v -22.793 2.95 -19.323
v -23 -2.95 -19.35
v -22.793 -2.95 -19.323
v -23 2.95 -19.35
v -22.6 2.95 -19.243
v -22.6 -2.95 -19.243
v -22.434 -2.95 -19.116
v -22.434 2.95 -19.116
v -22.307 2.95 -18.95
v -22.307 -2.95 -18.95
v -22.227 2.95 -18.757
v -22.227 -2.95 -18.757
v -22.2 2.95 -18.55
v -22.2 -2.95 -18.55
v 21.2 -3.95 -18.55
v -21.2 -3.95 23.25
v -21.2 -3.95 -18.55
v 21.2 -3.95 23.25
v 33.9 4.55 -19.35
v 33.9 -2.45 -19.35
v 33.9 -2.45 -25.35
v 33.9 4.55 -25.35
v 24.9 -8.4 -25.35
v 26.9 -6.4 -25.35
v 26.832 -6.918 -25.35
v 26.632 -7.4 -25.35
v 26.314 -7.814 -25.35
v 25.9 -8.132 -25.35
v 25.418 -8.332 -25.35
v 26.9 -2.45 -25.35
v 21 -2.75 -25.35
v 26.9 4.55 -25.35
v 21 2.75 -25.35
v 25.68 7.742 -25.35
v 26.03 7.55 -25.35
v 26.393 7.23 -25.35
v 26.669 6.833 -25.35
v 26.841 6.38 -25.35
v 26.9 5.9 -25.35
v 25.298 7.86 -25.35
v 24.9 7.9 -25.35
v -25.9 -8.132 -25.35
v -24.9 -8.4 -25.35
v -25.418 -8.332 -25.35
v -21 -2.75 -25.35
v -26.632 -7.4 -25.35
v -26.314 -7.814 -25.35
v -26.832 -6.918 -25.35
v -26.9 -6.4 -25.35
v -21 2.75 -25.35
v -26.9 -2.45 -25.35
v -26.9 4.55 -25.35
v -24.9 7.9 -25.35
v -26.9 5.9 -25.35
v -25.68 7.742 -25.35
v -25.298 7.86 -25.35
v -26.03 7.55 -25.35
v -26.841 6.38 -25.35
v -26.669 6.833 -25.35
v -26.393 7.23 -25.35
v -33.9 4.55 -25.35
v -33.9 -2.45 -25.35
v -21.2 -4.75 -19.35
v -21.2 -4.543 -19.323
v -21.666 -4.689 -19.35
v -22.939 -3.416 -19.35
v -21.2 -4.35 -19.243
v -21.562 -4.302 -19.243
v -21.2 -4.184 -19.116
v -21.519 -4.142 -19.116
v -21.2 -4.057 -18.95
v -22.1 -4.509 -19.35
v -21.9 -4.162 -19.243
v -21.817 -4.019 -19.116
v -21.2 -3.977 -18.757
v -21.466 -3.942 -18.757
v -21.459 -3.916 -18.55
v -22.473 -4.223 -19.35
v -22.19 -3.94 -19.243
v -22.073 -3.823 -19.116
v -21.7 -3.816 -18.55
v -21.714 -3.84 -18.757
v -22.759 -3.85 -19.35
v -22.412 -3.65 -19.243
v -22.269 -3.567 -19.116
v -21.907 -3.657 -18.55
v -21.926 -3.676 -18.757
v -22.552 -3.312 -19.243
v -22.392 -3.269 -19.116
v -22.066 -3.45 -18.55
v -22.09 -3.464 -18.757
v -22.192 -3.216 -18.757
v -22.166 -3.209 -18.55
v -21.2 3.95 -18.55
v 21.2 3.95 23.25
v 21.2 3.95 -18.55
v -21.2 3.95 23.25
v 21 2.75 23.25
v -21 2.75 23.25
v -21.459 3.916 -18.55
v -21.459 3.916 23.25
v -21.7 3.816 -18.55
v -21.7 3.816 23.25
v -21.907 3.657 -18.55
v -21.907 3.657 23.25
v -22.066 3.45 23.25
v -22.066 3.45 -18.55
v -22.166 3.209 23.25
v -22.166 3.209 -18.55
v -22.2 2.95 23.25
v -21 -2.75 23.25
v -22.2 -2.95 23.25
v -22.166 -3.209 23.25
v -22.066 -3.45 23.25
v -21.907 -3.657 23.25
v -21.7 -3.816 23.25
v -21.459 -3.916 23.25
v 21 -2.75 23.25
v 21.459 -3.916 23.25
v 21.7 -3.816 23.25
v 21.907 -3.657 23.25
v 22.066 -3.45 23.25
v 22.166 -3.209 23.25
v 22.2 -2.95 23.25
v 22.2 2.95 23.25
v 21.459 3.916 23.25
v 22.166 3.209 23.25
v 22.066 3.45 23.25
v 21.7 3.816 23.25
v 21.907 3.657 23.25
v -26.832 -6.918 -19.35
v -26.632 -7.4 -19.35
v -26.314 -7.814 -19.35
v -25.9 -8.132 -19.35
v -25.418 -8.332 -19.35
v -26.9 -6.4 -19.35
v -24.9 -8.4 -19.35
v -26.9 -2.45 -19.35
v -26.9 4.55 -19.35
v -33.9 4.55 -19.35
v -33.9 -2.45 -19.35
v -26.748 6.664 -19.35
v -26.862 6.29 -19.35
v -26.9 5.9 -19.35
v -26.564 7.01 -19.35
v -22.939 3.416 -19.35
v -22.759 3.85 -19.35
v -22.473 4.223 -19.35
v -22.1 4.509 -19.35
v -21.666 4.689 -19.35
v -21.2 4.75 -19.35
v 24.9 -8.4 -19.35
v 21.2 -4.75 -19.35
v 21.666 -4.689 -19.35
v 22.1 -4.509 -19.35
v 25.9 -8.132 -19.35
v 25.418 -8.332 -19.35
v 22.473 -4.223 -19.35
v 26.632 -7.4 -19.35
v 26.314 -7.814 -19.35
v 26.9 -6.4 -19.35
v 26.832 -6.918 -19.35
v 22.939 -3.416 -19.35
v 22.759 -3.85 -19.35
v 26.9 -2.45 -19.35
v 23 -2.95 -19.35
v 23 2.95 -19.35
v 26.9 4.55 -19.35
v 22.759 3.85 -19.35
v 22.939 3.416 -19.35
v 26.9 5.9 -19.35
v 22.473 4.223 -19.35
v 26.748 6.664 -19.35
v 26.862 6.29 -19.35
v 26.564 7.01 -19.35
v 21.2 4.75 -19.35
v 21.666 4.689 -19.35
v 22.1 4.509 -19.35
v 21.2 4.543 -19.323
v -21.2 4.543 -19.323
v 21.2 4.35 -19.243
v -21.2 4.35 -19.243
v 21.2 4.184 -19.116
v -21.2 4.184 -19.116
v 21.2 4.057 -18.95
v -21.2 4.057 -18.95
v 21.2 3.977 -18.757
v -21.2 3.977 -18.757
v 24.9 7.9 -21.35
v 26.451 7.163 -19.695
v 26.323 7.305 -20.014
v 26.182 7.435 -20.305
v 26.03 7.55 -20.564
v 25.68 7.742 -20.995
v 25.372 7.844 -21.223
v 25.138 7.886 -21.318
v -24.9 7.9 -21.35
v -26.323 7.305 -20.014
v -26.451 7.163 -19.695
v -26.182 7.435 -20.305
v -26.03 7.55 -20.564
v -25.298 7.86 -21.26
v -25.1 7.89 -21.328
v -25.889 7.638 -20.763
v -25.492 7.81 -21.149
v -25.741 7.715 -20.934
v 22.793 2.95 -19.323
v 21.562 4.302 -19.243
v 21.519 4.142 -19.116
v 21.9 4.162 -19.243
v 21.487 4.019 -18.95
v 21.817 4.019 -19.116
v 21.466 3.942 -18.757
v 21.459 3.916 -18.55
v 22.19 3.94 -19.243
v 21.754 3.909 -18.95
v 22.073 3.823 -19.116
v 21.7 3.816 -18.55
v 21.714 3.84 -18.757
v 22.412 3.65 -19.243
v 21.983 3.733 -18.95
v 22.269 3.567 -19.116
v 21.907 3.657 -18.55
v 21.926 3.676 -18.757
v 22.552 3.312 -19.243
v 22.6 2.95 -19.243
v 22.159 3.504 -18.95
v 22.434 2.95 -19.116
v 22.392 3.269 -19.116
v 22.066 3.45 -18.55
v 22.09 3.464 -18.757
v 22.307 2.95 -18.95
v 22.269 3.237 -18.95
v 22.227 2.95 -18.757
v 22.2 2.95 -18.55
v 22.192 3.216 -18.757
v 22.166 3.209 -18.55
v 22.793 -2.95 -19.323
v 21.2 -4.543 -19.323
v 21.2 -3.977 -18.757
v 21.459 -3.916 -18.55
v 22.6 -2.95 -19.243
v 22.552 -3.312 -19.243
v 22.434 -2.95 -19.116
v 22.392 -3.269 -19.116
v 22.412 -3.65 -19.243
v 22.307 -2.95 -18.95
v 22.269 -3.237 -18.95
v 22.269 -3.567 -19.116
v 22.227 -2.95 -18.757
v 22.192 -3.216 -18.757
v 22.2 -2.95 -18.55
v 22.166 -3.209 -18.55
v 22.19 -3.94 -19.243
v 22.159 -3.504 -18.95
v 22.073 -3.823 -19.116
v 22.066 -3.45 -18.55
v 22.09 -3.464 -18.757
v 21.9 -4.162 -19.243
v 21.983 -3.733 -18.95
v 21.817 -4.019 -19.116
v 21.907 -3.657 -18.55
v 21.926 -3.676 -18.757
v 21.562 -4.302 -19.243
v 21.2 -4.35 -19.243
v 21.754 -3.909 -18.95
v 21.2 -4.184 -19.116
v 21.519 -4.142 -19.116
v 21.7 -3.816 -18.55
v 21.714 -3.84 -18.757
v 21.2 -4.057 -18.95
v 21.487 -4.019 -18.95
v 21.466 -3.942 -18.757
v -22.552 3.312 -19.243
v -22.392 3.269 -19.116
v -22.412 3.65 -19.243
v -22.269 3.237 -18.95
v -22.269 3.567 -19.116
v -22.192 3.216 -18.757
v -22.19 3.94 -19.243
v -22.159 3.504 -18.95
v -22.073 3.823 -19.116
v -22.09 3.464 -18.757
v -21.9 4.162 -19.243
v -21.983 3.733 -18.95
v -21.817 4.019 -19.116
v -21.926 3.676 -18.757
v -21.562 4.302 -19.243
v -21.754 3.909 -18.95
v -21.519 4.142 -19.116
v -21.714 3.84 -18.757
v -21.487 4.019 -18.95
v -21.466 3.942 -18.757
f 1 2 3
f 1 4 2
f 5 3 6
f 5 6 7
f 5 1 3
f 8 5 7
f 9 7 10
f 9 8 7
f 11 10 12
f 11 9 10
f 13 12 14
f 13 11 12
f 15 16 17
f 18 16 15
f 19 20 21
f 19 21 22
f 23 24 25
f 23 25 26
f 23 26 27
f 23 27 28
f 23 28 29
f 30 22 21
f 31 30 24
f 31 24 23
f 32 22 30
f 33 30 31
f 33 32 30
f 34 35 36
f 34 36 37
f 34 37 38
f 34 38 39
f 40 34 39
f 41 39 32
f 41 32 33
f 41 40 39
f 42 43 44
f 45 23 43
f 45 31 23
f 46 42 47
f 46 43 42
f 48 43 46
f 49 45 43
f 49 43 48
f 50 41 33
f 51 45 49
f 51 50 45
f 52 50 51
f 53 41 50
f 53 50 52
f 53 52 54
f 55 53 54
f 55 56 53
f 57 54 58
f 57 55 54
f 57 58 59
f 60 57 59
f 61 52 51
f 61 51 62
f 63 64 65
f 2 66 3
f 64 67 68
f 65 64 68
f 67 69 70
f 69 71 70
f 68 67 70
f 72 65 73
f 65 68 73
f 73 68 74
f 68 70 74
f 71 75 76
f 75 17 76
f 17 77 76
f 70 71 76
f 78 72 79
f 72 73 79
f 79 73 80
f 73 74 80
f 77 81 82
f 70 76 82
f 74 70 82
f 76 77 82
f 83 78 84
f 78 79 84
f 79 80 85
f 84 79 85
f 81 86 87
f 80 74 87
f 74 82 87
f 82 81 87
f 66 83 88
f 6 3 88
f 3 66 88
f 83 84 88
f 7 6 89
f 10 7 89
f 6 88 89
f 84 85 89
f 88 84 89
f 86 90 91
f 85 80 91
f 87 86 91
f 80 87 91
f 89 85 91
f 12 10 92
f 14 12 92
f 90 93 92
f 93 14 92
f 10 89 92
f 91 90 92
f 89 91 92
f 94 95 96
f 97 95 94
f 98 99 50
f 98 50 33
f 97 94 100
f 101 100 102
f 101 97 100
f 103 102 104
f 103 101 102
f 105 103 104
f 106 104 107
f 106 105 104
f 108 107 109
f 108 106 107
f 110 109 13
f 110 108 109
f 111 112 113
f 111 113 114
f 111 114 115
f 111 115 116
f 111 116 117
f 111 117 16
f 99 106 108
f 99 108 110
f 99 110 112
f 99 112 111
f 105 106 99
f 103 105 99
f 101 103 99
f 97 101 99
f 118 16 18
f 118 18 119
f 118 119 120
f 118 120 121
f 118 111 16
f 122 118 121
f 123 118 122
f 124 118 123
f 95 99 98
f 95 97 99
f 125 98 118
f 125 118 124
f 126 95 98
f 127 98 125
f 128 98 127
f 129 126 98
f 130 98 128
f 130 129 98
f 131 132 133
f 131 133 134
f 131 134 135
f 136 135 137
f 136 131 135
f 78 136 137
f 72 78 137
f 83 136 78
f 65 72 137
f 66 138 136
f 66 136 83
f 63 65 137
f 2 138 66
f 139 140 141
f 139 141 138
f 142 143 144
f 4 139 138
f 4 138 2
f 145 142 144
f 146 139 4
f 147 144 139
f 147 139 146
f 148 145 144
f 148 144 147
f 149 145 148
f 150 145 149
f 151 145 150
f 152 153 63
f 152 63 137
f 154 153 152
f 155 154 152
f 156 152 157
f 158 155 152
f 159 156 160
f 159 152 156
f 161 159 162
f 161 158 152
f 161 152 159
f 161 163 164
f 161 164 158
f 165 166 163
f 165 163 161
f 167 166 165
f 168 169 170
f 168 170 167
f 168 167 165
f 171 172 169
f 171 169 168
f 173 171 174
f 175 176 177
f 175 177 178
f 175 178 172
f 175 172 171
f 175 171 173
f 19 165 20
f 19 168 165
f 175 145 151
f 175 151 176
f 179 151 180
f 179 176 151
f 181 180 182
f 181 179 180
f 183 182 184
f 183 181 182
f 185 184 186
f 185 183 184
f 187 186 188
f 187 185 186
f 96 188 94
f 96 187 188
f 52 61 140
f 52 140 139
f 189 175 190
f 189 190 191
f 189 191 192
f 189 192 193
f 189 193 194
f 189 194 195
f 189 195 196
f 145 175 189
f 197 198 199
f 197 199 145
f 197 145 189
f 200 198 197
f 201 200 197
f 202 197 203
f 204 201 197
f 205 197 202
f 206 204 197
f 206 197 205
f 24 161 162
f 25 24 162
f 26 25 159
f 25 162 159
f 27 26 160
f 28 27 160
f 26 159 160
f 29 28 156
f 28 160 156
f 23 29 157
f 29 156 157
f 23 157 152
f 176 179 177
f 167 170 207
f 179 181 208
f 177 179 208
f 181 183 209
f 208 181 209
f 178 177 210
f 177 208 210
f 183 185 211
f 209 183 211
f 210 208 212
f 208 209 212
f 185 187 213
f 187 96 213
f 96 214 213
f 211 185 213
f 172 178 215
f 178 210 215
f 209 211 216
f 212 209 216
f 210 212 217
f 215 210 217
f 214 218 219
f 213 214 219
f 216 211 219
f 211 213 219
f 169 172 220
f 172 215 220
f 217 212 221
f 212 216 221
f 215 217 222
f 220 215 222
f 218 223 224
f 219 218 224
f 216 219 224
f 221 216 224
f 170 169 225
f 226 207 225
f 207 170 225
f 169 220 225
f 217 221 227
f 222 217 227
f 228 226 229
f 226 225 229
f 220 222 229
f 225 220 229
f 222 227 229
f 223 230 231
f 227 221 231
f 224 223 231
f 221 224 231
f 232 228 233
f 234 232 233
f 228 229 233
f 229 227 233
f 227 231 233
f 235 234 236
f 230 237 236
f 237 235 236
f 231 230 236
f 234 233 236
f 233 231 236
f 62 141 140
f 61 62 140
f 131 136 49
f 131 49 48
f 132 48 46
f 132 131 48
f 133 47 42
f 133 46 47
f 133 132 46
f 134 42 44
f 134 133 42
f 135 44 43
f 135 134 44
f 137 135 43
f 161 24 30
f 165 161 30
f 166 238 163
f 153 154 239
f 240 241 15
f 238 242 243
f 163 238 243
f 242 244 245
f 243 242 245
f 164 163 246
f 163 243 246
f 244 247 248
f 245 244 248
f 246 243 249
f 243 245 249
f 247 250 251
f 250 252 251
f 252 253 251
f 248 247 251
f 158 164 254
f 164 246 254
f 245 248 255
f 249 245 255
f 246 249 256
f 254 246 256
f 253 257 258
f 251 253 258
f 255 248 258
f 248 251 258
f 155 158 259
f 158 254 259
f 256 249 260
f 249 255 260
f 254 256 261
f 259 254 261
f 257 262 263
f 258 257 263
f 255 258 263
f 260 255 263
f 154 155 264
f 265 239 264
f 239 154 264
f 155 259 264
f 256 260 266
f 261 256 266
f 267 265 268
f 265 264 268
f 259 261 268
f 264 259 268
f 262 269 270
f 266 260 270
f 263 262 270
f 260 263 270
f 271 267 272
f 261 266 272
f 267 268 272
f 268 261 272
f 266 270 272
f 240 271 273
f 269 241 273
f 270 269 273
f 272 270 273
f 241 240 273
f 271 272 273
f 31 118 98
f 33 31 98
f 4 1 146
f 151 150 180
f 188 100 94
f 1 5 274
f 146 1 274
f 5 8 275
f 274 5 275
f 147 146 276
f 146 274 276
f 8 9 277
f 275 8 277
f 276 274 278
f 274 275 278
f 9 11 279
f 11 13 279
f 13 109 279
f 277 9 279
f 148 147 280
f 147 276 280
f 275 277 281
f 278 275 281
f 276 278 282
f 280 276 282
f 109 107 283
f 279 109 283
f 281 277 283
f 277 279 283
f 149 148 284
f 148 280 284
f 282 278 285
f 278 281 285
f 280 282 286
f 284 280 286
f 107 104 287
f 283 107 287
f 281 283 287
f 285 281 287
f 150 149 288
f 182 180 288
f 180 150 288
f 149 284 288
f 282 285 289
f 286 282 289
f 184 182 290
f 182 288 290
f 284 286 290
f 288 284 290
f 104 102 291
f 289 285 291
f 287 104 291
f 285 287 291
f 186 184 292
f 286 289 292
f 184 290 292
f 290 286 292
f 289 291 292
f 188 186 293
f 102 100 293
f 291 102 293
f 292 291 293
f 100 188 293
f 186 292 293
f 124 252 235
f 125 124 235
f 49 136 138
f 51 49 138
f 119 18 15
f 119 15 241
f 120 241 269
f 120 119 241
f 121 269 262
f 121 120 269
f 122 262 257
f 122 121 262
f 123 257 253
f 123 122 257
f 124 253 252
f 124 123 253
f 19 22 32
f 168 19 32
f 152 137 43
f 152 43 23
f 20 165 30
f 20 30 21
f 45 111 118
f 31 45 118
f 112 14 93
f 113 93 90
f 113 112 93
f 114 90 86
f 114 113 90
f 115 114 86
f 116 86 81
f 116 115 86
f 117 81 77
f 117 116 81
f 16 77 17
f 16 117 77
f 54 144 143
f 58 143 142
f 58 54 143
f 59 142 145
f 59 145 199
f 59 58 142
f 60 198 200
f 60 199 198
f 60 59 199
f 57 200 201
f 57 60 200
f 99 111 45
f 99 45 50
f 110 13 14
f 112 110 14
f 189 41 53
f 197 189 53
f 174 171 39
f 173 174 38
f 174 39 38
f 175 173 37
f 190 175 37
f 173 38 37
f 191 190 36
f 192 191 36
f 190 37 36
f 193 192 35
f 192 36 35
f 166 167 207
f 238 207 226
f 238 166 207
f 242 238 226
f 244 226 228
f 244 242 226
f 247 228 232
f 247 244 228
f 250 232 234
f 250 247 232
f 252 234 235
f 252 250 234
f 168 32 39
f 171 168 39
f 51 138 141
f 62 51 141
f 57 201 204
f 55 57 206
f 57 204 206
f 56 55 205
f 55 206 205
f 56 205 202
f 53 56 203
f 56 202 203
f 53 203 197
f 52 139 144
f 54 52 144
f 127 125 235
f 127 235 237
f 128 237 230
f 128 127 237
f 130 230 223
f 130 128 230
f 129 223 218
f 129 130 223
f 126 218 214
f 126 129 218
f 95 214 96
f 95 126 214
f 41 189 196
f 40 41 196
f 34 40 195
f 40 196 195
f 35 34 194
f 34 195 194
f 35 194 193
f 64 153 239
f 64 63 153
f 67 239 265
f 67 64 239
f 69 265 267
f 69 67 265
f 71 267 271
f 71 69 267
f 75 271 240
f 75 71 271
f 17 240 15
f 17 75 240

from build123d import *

# Parameters (mm, degrees)
SKETCH1_W           = 53.8
SKETCH1_H           = 16.8
SKETCH1_W_2         = 42
SKETCH1_H_2         = 5.5
BOSS_EXTRUDE1_DEPTH = 27
SKETCH4_W           = 53.8
SKETCH4_H           = 16.8
SKETCH4_W_2         = 44.4
SKETCH4_H_2         = 7.9
CUT_EXTRUDE2_DEPTH  = 19.35
SKETCH2_W           = 7
SKETCH2_H           = 10
BOSS_EXTRUDE2_DEPTH = 6
SKETCH3_R           = 1.35
CUT_EXTRUDE1_DEPTH  = 8
CUT_EXTRUDE4_REACH  = 66.31
SKETCH7_W           = 53.8
SKETCH7_H           = 0.5
FILLET2_R           = 1
FILETE1_R           = 2
SKETCH5_W           = 53.8
SKETCH5_H           = 16.8
CUT_EXTRUDE3_DEPTH  = 1.65
CUT_EXTRUDE5_REACH  = 63.565
CUT_EXTRUDE6_REACH  = 64.931
BOSS_EXTRUDE3_START = -7
SKETCH10_R          = 1.35
BOSS_EXTRUDE3_DEPTH = 7
CUT_EXTRUDE7_DEPTH  = 1.65
SKETCH13_W          = 6
SKETCH13_H          = 16.8
CUT_EXTRUDE8_DEPTH  = 73.869901194
FILLET6_R           = 0.8
BOSS_EXTRUDE4_START = 3.9
SKETCH14_W          = 42
SKETCH14_H          = 5.5
BOSS_EXTRUDE4_DEPTH = 3.9


with BuildPart() as part:
    # Sketch1 → Boss-Extrude1 (new, symmetric)
    with BuildSketch(Plane.XY):
        Rectangle(SKETCH1_W, SKETCH1_H)
        Rectangle(SKETCH1_W_2, SKETCH1_H_2, mode=Mode.SUBTRACT)
    extrude(amount=BOSS_EXTRUDE1_DEPTH, both=True)

    # Sketch4 → Cut-Extrude2 (cut, symmetric)
    with BuildSketch(Plane.XY):
        Rectangle(SKETCH4_W, SKETCH4_H)
        Rectangle(SKETCH4_W_2, SKETCH4_H_2, mode=Mode.SUBTRACT)
    extrude(amount=CUT_EXTRUDE2_DEPTH, both=True, mode=Mode.SUBTRACT)

    # Sketch2 → Boss-Extrude2 (add)
    with BuildSketch(Plane(origin=(0, 0, 19.35), x_dir=(-1, 0, 0), z_dir=(0, 0, -1))):
        with Locations((-30.4, 2.55)):
            Rectangle(SKETCH2_W, SKETCH2_H)
        with Locations((30.4, 2.55)):
            Rectangle(SKETCH2_W, SKETCH2_H)
    boss_extrude2 = extrude(amount=-BOSS_EXTRUDE2_DEPTH)

    # Sketch3 → Cut-Extrude1 (cut)
    with BuildSketch(Plane.XZ.offset(2.45)):
        with Locations((-30.9, 22.35)):
            Circle(SKETCH3_R)
        with Locations((30.9, 22.35)):
            Circle(SKETCH3_R)
    cut_extrude1 = extrude(amount=-CUT_EXTRUDE1_DEPTH, mode=Mode.SUBTRACT)

    # Mirror8: Boss-Extrude2, Cut-Extrude1 across plane
    add(boss_extrude2.mirror(Plane.XY))
    add(cut_extrude1.mirror(Plane.XY), mode=Mode.SUBTRACT)

    # Sketch7 → Cut-Extrude4 (cut, up to next)
    with BuildSketch(Plane(origin=(0, 0, -27), x_dir=(-1, 0, 0), z_dir=(0, 0, -1)), mode=Mode.PRIVATE) as cut_extrude4_sk1:
        with Locations((0, 8.15)):
            Rectangle(SKETCH7_W, SKETCH7_H)
    cut_extrude4_tool1 = extrude(cut_extrude4_sk1.sketch, amount=-CUT_EXTRUDE4_REACH, mode=Mode.PRIVATE) & part.part
    add(cut_extrude4_tool1.solids().sort_by_distance((0, 8.15, -27))[0], mode=Mode.SUBTRACT)

    # Fillet2
    fillet2_edges = [part.edges().sort_by_distance(p)[0] for p in [
        (-22.2, -3.95, 0),
        (-22.2, 3.95, 0),
        (22.2, 3.95, 0),
        (22.2, -3.95, 0),
    ]]
    fillet(fillet2_edges, radius=FILLET2_R)

    # Filete1
    filete1_edges = [part.edges().sort_by_distance(p)[0] for p in [
        (-26.9, -8.4, -23.175),
        (26.9, -8.4, -23.175),
        (26.9, -8.4, 23.175),
        (-26.9, -8.4, 23.175),
        (26.9, 8.4, 23.175),
        (-26.9, 8.4, 23.175),
        (-26.9, 7.9, -23.175),
        (26.9, 7.9, -23.175),
    ]]
    fillet(filete1_edges, radius=FILETE1_R)

    # Sketch5 → Cut-Extrude3 (cut)
    with BuildSketch(Plane.XY.offset(27)):
        Rectangle(SKETCH5_W, SKETCH5_H)
    extrude(amount=-CUT_EXTRUDE3_DEPTH, mode=Mode.SUBTRACT)

    # Chamfer1
    # the kernel refuses this chamfer: 2, 0.890457371 mm, written as the material it takes off along each edge
    with BuildSketch(Plane(origin=(-37.34003391, 7.9, -19.35), x_dir=(0, -0.9968798599783938, 0.07893379991776824), z_dir=(1, 0, 0))) as chamfer1_piece_1:
        with BuildLine():
            Line((0.925885194, 0), (-0.196073774, 2.064046904))
            Line((-0.196073774, 2.064046904), (-0.235948969, 2.060889552))
            ThreePointArc((-0.235948969, 2.060889552), (-0.121693379, 1.030150311), (-0.039875194, -0.003157352))
            Line((-0.039875194, -0.003157352), (0.003157352, -0.039875194))
            ThreePointArc((0.003157352, -0.039875194), (0.463215564, -0.003447392), (0.929042546, -0.039875194))
            Line((0.929042546, -0.039875194), (0.925885194, 0))
        make_face()
    extrude(amount=74.680067819, mode=Mode.SUBTRACT)

    # Sketch8 → Cut-Extrude5 (cut, up to next)
    with BuildSketch(Plane(origin=(0, 0, -25.35), x_dir=(-1, 0, 0), z_dir=(0, 0, -1)), mode=Mode.PRIVATE) as cut_extrude5_sk1:
        with BuildLine():
            Line((-26.030265456, 7.55), (-33.9, 7.55))
            Line((-33.9, 7.55), (-33.9, 4.55))
            Line((-33.9, 4.55), (-26.9, 4.55))
            Line((-26.9, 4.55), (-26.9, 5.9))
            ThreePointArc((-26.9, 5.9), (-26.669255622, 6.832595595), (-26.030265456, 7.55))
        make_face()
    cut_extrude5_tool1 = extrude(cut_extrude5_sk1.sketch, amount=-CUT_EXTRUDE5_REACH, mode=Mode.PRIVATE) & part.part
    # Sketch8 → Cut-Extrude5 (cut, up to next)
    with BuildSketch(Plane(origin=(0, 0, -25.35), x_dir=(-1, 0, 0), z_dir=(0, 0, -1)), mode=Mode.PRIVATE) as cut_extrude5_sk2:
        with BuildLine():
            Line((26.9, 4.55), (26.9, 5.9))
            ThreePointArc((26.9, 5.9), (26.669255622, 6.832595595), (26.030265456, 7.55))
            Line((26.030265456, 7.55), (33.9, 7.55))
            Line((33.9, 7.55), (33.9, 4.55))
            Line((33.9, 4.55), (26.9, 4.55))
        make_face()
    cut_extrude5_tool2 = extrude(cut_extrude5_sk2.sketch, amount=-CUT_EXTRUDE5_REACH, mode=Mode.PRIVATE) & part.part
    add(cut_extrude5_tool1.solids().sort_by_distance((30.325305, 6.072078, -25.35))[0], mode=Mode.SUBTRACT)
    add(cut_extrude5_tool2.solids().sort_by_distance((-30.325305, 6.072078, -25.35))[0], mode=Mode.SUBTRACT)

    # Sketch9 → Cut-Extrude6 (cut, up to next)
    with BuildSketch(Plane.XY.offset(25.35), mode=Mode.PRIVATE) as cut_extrude6_sk1:
        Polygon((26.9, 5.9), (26.9, 7.55), (33.9, 7.55), (33.9, 4.55), (26.9, 4.55), align=None)
    cut_extrude6_tool1 = extrude(cut_extrude6_sk1.sketch, amount=-CUT_EXTRUDE6_REACH, mode=Mode.PRIVATE) & part.part
    # Sketch9 → Cut-Extrude6 (cut, up to next)
    with BuildSketch(Plane.XY.offset(25.35), mode=Mode.PRIVATE) as cut_extrude6_sk2:
        Polygon((-26.9, 5.9), (-26.9, 4.55), (-33.9, 4.55), (-33.9, 7.55), (-26.9, 7.55), align=None)
    cut_extrude6_tool2 = extrude(cut_extrude6_sk2.sketch, amount=-CUT_EXTRUDE6_REACH, mode=Mode.PRIVATE) & part.part
    add(cut_extrude6_tool1.solids().sort_by_distance((30.4, 6.05, 25.35))[0], mode=Mode.SUBTRACT)
    add(cut_extrude6_tool2.solids().sort_by_distance((-30.4, 6.05, 25.35))[0], mode=Mode.SUBTRACT)

    # Sketch10 → Boss-Extrude3 (add)
    with BuildSketch(Plane(origin=(0, 4.55, 0), x_dir=(1, 0, 0), z_dir=(0, 1, 0)).offset(BOSS_EXTRUDE3_START)):
        with Locations((30.9, -22.35)):
            Circle(SKETCH10_R)
        with Locations((-30.9, -22.35)):
            Circle(SKETCH10_R)
    boss_extrude3 = extrude(amount=BOSS_EXTRUDE3_DEPTH)

    # Mirror9: Boss-Extrude3 across plane
    add(boss_extrude3.mirror(Plane.XY))

    # Sketch11 → Cut-Extrude7 (cut)
    with BuildSketch(Plane(origin=(0, 0, -27), x_dir=(-1, 0, 0), z_dir=(0, 0, -1))):
        with BuildLine():
            Line((26.9, -6.4), (26.9, 5.9))
            ThreePointArc((26.9, 5.9), (26.314213562, 7.314213562), (24.9, 7.9))
            Line((24.9, 7.9), (-24.9, 7.9))
            ThreePointArc((-24.9, 7.9), (-26.314213562, 7.314213562), (-26.9, 5.9))
            Line((-26.9, 5.9), (-26.9, -6.4))
            ThreePointArc((-26.9, -6.4), (-26.314213562, -7.814213562), (-24.9, -8.4))
            Line((-24.9, -8.4), (24.9, -8.4))
            ThreePointArc((24.9, -8.4), (26.314213562, -7.814213562), (26.9, -6.4))
        make_face()
    extrude(amount=-CUT_EXTRUDE7_DEPTH, mode=Mode.SUBTRACT)

    # Sketch13 → Cut-Extrude8 (cut, through all)
    with BuildSketch(Plane.ZY.offset(33.9)):
        with Locations((22.35, 0)):
            Rectangle(SKETCH13_W, SKETCH13_H)
    extrude(amount=-CUT_EXTRUDE8_DEPTH, mode=Mode.SUBTRACT)

    # Fillet6
    fillet6_edges = [part.edges().sort_by_distance(p)[0] for p in [
        (-22.2, 0, -19.35),
        (0, -3.95, -19.35),
        (22.2, 0, -19.35),
        (0, 3.95, -19.35),
        (-21.907106781, -3.657106781, -19.35),
        (21.907106781, -3.657106781, -19.35),
        (21.907106781, 3.657106781, -19.35),
        (-21.907106781, 3.657106781, -19.35),
    ]]
    fillet(fillet6_edges, radius=FILLET6_R)

    # Sketch14 → Boss-Extrude4 (add)
    with BuildSketch(Plane.XY.offset(19.35).offset(BOSS_EXTRUDE4_START)):
        with BuildLine():
            Line((22.2, -2.95), (22.2, 2.95))
            ThreePointArc((22.2, 2.95), (21.907106781, 3.657106781), (21.2, 3.95))
            Line((21.2, 3.95), (-21.2, 3.95))
            ThreePointArc((-21.2, 3.95), (-21.907106781, 3.657106781), (-22.2, 2.95))
            Line((-22.2, 2.95), (-22.2, -2.95))
            ThreePointArc((-22.2, -2.95), (-21.907106781, -3.657106781), (-21.2, -3.95))
            Line((-21.2, -3.95), (21.2, -3.95))
            ThreePointArc((21.2, -3.95), (21.907106781, -3.657106781), (22.2, -2.95))
        make_face()
        Rectangle(SKETCH14_W, SKETCH14_H, mode=Mode.SUBTRACT)
    extrude(amount=-BOSS_EXTRUDE4_DEPTH)


solid = part.part
